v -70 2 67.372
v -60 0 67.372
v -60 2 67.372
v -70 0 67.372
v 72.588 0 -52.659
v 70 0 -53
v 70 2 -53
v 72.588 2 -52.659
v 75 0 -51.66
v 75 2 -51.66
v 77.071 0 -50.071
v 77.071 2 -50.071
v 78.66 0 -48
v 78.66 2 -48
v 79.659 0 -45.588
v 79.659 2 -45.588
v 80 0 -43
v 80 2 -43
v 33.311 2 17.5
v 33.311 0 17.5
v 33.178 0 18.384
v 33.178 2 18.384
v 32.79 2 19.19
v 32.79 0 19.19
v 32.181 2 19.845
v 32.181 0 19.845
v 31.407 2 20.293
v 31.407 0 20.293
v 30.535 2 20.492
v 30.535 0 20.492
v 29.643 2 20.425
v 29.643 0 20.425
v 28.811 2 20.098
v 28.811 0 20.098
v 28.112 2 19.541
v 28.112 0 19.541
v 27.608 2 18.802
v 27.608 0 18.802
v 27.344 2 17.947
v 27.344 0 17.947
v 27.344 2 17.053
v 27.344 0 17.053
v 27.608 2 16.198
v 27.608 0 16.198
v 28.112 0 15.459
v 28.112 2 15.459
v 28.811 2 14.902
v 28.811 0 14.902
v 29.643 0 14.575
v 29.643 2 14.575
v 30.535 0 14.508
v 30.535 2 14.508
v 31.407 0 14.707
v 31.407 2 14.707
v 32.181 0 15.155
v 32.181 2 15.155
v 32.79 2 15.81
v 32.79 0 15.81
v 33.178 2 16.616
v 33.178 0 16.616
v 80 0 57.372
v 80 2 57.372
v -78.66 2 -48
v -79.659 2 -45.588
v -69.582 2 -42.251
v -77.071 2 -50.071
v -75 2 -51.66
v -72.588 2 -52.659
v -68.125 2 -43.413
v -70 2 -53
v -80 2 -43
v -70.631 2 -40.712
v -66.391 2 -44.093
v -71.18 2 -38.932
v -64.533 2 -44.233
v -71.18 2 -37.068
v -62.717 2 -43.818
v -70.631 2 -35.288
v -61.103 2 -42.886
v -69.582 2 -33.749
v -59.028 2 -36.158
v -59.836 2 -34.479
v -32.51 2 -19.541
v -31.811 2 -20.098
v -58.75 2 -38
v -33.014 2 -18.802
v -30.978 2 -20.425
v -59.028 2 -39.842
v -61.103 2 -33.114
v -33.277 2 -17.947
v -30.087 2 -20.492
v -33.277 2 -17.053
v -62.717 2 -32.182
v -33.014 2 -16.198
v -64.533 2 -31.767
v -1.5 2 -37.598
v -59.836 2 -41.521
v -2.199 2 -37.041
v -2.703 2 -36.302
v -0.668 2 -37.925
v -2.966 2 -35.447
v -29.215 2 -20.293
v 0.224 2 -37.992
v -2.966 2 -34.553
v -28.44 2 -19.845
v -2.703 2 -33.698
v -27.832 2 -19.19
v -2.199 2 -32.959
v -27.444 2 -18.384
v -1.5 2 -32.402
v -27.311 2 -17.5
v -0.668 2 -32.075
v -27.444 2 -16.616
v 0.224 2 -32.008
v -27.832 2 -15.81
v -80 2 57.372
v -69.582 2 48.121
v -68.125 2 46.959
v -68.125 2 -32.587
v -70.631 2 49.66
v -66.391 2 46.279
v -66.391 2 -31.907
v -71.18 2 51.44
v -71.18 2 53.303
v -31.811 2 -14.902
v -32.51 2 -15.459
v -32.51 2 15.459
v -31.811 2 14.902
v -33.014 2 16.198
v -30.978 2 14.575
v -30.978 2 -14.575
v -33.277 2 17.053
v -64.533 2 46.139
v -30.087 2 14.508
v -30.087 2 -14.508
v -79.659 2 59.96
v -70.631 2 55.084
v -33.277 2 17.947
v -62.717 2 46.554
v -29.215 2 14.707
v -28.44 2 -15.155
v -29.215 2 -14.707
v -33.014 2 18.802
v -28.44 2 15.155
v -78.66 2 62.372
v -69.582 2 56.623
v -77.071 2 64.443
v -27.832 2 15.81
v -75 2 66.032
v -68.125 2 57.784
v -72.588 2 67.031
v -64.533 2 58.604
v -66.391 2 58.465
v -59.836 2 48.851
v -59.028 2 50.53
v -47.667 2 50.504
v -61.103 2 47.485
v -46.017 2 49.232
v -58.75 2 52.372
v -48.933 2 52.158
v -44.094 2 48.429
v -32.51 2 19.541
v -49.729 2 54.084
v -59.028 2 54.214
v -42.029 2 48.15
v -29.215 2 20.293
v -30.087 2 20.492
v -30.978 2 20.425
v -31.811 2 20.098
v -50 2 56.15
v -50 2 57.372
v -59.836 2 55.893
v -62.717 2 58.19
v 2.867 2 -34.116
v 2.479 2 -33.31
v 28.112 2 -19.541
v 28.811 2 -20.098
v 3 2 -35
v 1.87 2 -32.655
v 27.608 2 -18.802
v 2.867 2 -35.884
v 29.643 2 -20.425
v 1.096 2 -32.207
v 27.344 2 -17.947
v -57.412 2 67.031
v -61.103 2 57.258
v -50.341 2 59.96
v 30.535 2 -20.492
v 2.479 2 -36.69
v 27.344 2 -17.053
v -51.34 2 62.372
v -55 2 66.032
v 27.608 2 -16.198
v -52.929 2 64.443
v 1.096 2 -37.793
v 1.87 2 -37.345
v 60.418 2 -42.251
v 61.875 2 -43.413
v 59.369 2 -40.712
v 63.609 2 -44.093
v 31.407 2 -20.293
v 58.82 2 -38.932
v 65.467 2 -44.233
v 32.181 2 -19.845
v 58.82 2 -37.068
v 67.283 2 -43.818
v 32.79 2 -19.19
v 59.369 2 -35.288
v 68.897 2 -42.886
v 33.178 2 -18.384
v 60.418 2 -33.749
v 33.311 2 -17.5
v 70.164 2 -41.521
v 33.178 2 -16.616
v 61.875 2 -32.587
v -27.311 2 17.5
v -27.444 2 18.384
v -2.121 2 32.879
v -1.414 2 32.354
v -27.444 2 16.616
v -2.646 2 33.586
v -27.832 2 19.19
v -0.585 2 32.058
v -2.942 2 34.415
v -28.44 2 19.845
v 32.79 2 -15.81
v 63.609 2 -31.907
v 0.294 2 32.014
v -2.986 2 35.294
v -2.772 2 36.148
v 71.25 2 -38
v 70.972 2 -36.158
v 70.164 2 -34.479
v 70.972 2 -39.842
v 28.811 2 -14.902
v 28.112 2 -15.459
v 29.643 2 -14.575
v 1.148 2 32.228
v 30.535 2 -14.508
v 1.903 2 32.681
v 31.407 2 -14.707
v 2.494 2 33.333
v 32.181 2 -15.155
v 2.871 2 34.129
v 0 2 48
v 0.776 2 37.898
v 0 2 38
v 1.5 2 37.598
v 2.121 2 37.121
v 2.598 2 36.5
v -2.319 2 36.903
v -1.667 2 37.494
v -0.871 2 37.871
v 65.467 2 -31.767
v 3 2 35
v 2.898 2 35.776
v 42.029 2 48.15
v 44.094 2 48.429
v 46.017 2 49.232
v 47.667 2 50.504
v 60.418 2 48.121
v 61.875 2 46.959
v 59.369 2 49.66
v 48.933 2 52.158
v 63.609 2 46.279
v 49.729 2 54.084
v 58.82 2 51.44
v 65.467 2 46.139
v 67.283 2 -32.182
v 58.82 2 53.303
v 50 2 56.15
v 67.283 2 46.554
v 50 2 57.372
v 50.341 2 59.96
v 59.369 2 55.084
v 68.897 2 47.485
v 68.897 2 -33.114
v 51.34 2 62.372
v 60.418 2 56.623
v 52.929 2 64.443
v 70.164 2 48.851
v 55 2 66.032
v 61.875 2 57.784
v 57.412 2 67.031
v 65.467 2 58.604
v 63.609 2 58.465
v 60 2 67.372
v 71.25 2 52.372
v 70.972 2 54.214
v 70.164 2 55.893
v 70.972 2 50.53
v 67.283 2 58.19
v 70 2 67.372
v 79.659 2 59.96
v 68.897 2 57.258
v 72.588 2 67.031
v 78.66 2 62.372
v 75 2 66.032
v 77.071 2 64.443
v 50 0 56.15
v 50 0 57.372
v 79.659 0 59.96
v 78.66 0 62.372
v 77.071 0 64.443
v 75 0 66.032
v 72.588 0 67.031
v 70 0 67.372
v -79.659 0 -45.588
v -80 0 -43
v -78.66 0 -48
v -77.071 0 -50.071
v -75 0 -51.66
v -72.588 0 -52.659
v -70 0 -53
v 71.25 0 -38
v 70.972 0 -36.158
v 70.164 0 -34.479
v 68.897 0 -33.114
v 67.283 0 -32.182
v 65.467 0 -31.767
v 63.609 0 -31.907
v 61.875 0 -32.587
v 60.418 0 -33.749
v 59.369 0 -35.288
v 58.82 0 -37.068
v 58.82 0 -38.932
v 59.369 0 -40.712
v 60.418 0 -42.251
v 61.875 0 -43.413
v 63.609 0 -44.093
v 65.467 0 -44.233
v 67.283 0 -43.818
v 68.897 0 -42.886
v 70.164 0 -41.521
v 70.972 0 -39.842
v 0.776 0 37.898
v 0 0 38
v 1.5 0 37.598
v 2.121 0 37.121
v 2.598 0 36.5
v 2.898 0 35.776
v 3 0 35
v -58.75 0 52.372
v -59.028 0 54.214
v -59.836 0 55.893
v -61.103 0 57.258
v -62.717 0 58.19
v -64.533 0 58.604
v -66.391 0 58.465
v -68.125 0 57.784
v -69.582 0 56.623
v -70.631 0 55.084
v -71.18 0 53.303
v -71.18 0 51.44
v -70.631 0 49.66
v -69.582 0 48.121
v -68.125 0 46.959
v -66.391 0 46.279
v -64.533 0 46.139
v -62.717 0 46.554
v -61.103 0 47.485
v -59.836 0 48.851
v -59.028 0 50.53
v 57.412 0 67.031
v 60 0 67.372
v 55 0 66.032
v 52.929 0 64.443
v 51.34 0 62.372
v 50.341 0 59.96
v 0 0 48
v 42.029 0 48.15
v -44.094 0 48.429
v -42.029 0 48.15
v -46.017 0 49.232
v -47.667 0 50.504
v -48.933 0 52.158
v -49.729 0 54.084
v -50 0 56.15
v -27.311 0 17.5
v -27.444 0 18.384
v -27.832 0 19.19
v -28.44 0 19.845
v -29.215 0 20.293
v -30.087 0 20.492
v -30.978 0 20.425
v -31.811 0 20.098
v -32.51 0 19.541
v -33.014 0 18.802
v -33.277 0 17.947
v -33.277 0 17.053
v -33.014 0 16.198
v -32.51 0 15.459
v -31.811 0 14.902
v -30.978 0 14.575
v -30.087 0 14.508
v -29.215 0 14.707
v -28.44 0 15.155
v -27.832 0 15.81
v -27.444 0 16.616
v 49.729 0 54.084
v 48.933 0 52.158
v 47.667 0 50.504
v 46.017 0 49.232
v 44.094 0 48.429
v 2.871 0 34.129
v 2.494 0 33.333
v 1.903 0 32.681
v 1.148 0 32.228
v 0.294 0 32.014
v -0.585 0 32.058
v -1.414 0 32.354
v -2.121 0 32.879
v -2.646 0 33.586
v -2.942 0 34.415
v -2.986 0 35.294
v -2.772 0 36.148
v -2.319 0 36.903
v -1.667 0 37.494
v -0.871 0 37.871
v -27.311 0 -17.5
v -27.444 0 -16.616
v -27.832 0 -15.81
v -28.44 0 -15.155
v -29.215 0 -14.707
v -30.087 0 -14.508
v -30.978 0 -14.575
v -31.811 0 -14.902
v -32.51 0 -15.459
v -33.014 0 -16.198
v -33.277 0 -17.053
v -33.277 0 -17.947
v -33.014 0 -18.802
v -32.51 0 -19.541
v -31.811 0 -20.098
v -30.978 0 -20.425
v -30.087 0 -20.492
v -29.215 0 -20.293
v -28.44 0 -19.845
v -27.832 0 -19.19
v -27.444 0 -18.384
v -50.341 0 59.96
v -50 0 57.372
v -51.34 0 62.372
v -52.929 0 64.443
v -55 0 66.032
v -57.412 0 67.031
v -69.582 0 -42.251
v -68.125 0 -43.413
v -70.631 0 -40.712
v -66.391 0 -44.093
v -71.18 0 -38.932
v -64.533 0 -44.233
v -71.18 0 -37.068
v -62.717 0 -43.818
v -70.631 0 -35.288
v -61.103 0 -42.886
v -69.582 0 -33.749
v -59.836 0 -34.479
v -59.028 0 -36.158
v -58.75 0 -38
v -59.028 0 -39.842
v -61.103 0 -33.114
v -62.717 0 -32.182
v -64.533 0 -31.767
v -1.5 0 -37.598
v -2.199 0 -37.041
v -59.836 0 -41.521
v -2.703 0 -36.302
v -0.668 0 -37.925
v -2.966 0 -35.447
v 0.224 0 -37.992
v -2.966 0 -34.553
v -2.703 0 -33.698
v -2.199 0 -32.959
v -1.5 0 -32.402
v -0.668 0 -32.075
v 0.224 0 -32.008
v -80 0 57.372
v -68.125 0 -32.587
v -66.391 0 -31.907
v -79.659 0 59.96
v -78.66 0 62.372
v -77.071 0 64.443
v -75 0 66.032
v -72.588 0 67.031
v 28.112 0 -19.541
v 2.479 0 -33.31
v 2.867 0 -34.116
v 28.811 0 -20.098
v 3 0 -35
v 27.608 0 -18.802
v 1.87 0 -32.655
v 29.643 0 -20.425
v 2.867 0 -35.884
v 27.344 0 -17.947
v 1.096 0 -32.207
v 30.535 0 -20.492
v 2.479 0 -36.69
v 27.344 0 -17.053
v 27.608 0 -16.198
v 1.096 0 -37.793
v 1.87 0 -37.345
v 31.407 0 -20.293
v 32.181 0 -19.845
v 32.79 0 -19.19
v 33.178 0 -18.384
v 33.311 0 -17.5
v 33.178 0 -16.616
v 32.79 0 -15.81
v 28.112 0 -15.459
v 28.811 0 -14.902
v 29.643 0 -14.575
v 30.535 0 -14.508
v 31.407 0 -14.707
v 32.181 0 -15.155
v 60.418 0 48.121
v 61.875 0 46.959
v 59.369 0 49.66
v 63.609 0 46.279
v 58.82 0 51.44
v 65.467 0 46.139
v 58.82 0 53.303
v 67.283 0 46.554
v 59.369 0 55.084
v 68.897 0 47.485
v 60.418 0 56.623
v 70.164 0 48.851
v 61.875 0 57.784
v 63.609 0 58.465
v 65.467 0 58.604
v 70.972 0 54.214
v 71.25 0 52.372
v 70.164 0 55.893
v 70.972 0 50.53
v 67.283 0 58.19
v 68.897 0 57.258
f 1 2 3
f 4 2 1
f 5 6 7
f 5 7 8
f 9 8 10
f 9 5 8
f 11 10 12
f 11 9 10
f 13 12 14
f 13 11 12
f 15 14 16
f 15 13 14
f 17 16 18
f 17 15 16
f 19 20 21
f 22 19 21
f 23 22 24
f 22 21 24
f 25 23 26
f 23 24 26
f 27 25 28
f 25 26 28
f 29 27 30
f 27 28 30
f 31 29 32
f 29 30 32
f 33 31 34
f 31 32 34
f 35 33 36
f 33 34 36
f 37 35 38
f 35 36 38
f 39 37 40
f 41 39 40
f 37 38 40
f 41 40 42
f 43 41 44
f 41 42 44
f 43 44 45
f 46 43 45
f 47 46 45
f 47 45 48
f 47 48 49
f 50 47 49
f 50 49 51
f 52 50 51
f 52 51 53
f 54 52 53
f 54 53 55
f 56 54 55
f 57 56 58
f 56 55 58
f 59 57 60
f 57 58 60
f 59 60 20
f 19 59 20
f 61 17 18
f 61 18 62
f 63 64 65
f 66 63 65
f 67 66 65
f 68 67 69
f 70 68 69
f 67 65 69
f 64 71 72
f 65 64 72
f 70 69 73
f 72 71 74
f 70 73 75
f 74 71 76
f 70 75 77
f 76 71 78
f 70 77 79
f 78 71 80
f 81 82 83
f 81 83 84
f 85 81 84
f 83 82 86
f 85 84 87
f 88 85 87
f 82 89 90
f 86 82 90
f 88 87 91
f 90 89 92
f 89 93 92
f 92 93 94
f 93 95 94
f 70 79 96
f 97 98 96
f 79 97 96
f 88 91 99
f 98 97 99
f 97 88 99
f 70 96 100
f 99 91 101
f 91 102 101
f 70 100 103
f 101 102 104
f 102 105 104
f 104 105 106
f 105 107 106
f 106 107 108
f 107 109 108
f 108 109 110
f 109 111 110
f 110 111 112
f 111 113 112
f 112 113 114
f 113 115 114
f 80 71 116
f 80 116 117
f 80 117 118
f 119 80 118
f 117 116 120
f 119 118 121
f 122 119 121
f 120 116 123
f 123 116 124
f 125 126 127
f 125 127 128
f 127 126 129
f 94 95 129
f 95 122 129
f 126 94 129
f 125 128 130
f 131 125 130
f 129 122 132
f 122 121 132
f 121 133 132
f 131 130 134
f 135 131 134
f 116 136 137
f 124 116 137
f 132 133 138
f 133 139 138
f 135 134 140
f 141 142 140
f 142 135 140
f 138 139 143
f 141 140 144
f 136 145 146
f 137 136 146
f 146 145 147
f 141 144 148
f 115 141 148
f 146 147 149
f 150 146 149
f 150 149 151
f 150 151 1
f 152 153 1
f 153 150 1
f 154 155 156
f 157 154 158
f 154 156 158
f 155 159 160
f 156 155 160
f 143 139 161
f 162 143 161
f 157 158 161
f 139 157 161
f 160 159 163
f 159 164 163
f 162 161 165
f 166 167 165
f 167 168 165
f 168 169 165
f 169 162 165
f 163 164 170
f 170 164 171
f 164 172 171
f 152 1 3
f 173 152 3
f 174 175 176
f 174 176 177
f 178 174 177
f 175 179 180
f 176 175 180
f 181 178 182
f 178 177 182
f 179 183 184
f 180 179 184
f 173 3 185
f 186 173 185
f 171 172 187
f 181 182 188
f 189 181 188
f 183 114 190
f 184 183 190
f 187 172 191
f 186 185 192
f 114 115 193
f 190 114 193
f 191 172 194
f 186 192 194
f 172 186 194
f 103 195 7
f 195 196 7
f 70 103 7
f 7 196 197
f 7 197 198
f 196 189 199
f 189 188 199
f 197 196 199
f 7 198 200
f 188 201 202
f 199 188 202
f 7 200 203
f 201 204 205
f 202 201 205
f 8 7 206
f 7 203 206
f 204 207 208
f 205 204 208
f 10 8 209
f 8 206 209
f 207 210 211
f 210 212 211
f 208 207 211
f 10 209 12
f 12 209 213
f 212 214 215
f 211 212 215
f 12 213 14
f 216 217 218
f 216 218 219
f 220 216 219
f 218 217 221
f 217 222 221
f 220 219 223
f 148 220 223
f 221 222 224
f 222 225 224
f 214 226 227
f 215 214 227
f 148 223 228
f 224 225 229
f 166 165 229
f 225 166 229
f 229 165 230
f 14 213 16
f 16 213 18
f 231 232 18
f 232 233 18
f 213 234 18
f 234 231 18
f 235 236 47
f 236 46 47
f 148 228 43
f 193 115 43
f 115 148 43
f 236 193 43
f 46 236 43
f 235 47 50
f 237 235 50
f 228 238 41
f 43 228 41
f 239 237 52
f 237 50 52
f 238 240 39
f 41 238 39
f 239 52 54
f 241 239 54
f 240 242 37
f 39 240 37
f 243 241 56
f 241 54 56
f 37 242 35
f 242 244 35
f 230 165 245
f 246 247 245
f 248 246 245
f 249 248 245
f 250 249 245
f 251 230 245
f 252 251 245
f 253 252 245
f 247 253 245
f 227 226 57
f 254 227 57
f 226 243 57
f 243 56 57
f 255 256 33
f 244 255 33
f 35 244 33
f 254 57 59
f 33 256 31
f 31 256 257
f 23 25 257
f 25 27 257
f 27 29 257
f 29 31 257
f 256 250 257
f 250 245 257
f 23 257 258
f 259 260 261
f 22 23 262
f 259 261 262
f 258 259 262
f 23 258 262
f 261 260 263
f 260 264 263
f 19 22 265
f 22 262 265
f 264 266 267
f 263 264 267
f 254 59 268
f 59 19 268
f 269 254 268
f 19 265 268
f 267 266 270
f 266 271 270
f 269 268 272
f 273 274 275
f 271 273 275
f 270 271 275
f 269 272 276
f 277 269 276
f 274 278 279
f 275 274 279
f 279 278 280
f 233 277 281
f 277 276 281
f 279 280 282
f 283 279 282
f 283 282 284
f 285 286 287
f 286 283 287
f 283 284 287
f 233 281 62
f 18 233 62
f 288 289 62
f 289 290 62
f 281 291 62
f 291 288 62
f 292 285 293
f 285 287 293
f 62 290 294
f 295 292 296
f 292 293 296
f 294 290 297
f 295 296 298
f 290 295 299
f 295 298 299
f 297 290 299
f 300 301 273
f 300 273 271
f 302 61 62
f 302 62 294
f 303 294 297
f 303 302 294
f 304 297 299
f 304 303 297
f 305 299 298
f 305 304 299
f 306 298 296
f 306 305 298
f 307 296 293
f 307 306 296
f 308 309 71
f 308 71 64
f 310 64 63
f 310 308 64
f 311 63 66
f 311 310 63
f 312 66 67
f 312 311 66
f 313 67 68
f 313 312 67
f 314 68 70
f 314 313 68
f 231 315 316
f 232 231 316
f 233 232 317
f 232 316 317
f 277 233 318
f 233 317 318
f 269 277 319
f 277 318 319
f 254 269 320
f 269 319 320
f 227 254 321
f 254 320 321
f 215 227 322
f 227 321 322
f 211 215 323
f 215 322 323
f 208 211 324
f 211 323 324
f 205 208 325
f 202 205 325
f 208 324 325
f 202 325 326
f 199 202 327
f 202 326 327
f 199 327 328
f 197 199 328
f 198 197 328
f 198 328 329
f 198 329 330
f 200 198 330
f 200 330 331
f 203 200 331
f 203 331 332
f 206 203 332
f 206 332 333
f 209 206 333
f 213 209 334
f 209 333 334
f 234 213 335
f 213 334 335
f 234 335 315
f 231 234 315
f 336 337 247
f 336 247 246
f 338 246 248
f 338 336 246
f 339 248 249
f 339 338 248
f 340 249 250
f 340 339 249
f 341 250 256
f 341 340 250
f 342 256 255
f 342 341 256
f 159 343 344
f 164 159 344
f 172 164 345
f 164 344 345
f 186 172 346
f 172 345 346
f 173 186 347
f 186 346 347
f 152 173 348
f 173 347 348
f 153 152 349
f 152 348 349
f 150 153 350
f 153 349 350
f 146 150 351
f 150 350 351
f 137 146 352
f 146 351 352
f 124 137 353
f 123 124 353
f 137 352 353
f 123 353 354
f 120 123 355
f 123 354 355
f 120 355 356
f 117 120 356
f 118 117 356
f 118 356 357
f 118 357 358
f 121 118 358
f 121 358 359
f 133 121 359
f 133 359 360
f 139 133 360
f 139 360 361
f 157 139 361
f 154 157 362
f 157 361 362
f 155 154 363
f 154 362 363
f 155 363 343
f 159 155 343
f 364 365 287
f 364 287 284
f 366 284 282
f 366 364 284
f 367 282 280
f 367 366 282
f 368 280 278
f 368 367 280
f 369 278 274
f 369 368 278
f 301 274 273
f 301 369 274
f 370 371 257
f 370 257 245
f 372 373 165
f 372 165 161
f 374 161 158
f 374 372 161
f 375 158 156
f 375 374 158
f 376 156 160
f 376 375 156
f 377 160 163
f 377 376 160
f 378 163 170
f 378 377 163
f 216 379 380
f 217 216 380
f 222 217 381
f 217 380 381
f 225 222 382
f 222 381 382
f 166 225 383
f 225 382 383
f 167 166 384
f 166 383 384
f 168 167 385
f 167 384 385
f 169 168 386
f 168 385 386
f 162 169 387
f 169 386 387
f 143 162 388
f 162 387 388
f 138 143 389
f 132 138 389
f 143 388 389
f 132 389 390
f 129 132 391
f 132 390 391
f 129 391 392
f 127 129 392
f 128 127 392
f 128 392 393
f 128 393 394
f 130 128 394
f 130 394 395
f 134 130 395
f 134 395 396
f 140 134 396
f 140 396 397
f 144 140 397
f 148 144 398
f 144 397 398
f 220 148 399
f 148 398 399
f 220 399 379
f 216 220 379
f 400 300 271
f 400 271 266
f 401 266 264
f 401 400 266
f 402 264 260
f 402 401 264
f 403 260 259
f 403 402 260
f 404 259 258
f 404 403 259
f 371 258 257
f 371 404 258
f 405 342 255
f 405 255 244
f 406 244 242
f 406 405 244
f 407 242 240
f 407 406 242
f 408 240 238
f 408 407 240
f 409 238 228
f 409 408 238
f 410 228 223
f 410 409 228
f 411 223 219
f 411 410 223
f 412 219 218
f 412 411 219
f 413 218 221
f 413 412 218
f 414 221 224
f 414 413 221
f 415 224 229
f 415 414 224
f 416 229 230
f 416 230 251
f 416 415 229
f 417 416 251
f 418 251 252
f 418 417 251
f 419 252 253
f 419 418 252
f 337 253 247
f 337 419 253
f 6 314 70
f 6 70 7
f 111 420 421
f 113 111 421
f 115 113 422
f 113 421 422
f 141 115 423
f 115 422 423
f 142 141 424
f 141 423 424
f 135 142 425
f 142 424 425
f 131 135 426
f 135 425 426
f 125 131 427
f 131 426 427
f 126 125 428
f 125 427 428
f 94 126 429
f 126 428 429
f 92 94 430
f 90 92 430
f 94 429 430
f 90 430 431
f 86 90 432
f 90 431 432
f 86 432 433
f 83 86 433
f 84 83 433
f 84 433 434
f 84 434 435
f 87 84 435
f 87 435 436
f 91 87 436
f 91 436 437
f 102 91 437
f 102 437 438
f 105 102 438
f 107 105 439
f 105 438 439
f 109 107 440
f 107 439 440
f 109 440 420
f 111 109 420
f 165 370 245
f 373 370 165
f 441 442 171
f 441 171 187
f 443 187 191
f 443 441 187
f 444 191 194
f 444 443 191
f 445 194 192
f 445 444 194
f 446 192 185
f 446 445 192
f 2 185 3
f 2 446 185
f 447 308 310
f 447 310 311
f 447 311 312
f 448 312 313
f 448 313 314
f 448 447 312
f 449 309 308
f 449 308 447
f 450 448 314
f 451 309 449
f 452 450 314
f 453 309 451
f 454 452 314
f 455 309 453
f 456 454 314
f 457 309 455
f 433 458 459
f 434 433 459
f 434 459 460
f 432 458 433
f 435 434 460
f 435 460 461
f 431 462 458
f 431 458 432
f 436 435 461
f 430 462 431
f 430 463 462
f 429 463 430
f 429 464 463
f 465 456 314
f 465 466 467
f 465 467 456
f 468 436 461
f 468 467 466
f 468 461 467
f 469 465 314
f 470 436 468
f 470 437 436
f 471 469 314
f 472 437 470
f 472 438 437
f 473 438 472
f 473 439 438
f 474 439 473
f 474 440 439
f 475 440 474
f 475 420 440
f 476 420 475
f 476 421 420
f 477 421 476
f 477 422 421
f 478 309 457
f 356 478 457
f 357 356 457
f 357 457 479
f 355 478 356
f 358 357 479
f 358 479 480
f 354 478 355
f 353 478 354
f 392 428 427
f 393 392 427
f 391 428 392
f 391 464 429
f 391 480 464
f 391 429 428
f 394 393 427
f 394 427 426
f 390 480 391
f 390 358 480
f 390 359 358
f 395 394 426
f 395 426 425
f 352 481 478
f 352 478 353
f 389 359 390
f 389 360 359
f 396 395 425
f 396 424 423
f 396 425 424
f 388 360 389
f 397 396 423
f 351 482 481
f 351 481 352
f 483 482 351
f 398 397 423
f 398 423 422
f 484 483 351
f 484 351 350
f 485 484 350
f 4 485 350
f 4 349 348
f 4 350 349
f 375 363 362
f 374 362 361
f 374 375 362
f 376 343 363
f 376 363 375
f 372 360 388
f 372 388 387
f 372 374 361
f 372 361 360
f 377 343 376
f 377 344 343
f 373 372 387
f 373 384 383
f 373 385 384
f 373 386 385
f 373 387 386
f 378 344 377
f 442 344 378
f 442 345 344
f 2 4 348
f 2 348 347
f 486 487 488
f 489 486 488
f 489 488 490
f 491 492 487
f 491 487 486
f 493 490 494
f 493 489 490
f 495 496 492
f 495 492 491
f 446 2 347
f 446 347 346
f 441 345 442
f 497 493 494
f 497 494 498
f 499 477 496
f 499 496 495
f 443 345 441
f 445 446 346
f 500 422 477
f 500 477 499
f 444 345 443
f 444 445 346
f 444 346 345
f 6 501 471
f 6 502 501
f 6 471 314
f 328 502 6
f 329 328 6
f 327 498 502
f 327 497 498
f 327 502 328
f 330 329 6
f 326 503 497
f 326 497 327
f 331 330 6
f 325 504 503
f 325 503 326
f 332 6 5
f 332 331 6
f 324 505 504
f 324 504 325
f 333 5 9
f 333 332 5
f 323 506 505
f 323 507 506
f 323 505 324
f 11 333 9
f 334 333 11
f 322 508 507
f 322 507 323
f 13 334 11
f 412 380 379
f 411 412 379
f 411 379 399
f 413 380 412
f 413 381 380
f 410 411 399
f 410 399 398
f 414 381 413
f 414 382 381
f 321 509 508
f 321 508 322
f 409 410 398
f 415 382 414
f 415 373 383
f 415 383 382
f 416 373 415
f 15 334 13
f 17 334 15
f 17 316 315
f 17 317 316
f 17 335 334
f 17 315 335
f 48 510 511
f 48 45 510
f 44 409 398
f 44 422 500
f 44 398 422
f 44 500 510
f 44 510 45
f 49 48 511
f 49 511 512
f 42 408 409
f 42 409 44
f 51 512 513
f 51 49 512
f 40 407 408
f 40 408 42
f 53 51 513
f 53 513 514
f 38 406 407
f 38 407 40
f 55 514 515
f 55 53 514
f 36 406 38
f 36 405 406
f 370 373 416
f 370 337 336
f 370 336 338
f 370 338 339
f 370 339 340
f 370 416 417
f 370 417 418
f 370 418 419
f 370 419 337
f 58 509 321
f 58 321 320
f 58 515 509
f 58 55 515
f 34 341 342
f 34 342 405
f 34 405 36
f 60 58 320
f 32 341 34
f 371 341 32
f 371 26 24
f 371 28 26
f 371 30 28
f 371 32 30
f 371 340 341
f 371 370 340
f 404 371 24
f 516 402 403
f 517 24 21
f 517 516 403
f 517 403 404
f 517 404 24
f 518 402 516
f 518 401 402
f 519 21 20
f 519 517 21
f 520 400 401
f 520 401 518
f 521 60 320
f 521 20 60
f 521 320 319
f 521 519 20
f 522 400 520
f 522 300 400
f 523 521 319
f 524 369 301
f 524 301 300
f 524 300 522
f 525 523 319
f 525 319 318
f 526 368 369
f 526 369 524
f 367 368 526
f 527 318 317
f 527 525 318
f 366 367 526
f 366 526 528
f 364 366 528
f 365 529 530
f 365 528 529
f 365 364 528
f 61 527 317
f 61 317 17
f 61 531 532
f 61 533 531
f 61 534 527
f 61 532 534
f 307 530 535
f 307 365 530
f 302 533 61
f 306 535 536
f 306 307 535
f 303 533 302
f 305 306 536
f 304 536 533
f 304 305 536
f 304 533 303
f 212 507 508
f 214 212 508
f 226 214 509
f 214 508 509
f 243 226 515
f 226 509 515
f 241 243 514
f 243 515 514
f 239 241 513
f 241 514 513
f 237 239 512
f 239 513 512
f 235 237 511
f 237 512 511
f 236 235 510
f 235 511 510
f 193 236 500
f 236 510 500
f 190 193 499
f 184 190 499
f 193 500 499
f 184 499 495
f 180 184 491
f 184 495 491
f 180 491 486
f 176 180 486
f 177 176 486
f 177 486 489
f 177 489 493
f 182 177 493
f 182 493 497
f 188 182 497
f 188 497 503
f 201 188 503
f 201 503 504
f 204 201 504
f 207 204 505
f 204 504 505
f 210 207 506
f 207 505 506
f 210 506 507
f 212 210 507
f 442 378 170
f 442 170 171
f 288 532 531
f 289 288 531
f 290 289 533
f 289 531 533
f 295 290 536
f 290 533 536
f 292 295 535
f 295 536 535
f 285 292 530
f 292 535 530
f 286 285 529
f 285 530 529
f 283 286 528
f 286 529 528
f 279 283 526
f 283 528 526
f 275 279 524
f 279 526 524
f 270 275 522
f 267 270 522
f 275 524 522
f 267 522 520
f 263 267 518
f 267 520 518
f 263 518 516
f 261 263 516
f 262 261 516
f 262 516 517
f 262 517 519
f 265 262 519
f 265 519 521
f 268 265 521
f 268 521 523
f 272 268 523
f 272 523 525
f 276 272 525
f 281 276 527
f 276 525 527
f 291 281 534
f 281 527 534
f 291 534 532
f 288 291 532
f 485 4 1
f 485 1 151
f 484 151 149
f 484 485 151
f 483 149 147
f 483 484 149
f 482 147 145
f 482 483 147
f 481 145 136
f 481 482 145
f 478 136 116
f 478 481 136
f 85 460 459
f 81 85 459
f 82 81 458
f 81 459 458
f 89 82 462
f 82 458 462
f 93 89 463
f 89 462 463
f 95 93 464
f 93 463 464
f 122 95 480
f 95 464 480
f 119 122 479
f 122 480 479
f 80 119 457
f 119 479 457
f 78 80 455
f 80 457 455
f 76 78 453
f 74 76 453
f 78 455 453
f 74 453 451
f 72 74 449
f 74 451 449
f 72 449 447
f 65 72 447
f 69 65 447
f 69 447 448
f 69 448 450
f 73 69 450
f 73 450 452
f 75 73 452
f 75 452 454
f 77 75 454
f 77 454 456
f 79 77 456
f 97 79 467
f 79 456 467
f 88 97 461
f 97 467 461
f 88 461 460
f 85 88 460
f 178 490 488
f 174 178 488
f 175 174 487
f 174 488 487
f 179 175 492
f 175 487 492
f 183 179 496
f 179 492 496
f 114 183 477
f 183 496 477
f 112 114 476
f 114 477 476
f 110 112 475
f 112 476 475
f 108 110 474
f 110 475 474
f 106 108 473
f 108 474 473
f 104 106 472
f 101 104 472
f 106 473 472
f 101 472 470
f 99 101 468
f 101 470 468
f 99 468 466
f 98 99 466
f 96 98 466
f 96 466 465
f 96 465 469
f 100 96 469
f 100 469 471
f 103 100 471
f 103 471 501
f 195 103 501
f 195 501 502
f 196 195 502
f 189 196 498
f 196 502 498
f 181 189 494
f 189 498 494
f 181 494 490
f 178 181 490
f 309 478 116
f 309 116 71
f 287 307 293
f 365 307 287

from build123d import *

# Parameters (mm, degrees)
F1_R     = 6.25
F1_R_2   = 3
F2_DEPTH = 2


with BuildPart() as f2:
    # F1 (on Front) → F2 (new body)
    with BuildSketch(Plane.XZ):
        with BuildLine():
            Line((-60, 67.371839), (-70, 67.371839))
            ThreePointArc((-70, 67.371839), (-77.071068, 64.442907), (-80, 57.371839))
            Line((-80, 57.371839), (-80, 0))
            Line((-80, 0), (-80, -43))
            ThreePointArc((-80, -43), (-77.071068, -50.071068), (-70, -53))
            Line((-70, -53), (0, -53))
            Line((0, -53), (70, -53))
            ThreePointArc((70, -53), (77.071068, -50.071068), (80, -43))
            Line((80, -43), (80, 0))
            Line((80, 0), (80, 57.371839))
            ThreePointArc((80, 57.371839), (77.071068, 64.442907), (70, 67.371839))
            Line((70, 67.371839), (60, 67.371839))
            ThreePointArc((60, 67.371839), (52.928932, 64.442907), (50, 57.371839))
            Line((50, 57.371839), (50, 56.150236))
            ThreePointArc((50, 56.150236), (47.666959, 50.503505), (42.028607, 48.150288))
            Line((42.028607, 48.150288), (0, 48))
            Line((0, 48), (-42.028607, 48.150288))
            ThreePointArc((-42.028607, 48.150288), (-47.666959, 50.503505), (-50, 56.150236))
            Line((-50, 56.150236), (-50, 57.371839))
            ThreePointArc((-50, 57.371839), (-52.928932, 64.442907), (-60, 67.371839))
        make_face()
        with Locations((-65, -38)):
            Circle(F1_R, mode=Mode.SUBTRACT)
        with Locations((-30.310889, -17.5)):
            Circle(F1_R_2, mode=Mode.SUBTRACT)
        with Locations((0, -35)):
            Circle(F1_R_2, mode=Mode.SUBTRACT)
        with Locations((65, -38)):
            Circle(F1_R, mode=Mode.SUBTRACT)
        with Locations((30.310889, -17.5)):
            Circle(F1_R_2, mode=Mode.SUBTRACT)
        with Locations((-30.310889, 17.5)):
            Circle(F1_R_2, mode=Mode.SUBTRACT)
        with Locations((-65, 52.371839)):
            Circle(F1_R, mode=Mode.SUBTRACT)
        with Locations((30.310889, 17.5)):
            Circle(F1_R_2, mode=Mode.SUBTRACT)
        with BuildLine():
            ThreePointArc((3, 35), (-2.12132, 32.87868), (0, 38))
            ThreePointArc((0, 38), (2.12132, 37.12132), (3, 35))
        make_face(mode=Mode.SUBTRACT)
        with Locations((65, 52.371839)):
            Circle(F1_R, mode=Mode.SUBTRACT)
    extrude(amount=-F2_DEPTH)


solid = f2.part
